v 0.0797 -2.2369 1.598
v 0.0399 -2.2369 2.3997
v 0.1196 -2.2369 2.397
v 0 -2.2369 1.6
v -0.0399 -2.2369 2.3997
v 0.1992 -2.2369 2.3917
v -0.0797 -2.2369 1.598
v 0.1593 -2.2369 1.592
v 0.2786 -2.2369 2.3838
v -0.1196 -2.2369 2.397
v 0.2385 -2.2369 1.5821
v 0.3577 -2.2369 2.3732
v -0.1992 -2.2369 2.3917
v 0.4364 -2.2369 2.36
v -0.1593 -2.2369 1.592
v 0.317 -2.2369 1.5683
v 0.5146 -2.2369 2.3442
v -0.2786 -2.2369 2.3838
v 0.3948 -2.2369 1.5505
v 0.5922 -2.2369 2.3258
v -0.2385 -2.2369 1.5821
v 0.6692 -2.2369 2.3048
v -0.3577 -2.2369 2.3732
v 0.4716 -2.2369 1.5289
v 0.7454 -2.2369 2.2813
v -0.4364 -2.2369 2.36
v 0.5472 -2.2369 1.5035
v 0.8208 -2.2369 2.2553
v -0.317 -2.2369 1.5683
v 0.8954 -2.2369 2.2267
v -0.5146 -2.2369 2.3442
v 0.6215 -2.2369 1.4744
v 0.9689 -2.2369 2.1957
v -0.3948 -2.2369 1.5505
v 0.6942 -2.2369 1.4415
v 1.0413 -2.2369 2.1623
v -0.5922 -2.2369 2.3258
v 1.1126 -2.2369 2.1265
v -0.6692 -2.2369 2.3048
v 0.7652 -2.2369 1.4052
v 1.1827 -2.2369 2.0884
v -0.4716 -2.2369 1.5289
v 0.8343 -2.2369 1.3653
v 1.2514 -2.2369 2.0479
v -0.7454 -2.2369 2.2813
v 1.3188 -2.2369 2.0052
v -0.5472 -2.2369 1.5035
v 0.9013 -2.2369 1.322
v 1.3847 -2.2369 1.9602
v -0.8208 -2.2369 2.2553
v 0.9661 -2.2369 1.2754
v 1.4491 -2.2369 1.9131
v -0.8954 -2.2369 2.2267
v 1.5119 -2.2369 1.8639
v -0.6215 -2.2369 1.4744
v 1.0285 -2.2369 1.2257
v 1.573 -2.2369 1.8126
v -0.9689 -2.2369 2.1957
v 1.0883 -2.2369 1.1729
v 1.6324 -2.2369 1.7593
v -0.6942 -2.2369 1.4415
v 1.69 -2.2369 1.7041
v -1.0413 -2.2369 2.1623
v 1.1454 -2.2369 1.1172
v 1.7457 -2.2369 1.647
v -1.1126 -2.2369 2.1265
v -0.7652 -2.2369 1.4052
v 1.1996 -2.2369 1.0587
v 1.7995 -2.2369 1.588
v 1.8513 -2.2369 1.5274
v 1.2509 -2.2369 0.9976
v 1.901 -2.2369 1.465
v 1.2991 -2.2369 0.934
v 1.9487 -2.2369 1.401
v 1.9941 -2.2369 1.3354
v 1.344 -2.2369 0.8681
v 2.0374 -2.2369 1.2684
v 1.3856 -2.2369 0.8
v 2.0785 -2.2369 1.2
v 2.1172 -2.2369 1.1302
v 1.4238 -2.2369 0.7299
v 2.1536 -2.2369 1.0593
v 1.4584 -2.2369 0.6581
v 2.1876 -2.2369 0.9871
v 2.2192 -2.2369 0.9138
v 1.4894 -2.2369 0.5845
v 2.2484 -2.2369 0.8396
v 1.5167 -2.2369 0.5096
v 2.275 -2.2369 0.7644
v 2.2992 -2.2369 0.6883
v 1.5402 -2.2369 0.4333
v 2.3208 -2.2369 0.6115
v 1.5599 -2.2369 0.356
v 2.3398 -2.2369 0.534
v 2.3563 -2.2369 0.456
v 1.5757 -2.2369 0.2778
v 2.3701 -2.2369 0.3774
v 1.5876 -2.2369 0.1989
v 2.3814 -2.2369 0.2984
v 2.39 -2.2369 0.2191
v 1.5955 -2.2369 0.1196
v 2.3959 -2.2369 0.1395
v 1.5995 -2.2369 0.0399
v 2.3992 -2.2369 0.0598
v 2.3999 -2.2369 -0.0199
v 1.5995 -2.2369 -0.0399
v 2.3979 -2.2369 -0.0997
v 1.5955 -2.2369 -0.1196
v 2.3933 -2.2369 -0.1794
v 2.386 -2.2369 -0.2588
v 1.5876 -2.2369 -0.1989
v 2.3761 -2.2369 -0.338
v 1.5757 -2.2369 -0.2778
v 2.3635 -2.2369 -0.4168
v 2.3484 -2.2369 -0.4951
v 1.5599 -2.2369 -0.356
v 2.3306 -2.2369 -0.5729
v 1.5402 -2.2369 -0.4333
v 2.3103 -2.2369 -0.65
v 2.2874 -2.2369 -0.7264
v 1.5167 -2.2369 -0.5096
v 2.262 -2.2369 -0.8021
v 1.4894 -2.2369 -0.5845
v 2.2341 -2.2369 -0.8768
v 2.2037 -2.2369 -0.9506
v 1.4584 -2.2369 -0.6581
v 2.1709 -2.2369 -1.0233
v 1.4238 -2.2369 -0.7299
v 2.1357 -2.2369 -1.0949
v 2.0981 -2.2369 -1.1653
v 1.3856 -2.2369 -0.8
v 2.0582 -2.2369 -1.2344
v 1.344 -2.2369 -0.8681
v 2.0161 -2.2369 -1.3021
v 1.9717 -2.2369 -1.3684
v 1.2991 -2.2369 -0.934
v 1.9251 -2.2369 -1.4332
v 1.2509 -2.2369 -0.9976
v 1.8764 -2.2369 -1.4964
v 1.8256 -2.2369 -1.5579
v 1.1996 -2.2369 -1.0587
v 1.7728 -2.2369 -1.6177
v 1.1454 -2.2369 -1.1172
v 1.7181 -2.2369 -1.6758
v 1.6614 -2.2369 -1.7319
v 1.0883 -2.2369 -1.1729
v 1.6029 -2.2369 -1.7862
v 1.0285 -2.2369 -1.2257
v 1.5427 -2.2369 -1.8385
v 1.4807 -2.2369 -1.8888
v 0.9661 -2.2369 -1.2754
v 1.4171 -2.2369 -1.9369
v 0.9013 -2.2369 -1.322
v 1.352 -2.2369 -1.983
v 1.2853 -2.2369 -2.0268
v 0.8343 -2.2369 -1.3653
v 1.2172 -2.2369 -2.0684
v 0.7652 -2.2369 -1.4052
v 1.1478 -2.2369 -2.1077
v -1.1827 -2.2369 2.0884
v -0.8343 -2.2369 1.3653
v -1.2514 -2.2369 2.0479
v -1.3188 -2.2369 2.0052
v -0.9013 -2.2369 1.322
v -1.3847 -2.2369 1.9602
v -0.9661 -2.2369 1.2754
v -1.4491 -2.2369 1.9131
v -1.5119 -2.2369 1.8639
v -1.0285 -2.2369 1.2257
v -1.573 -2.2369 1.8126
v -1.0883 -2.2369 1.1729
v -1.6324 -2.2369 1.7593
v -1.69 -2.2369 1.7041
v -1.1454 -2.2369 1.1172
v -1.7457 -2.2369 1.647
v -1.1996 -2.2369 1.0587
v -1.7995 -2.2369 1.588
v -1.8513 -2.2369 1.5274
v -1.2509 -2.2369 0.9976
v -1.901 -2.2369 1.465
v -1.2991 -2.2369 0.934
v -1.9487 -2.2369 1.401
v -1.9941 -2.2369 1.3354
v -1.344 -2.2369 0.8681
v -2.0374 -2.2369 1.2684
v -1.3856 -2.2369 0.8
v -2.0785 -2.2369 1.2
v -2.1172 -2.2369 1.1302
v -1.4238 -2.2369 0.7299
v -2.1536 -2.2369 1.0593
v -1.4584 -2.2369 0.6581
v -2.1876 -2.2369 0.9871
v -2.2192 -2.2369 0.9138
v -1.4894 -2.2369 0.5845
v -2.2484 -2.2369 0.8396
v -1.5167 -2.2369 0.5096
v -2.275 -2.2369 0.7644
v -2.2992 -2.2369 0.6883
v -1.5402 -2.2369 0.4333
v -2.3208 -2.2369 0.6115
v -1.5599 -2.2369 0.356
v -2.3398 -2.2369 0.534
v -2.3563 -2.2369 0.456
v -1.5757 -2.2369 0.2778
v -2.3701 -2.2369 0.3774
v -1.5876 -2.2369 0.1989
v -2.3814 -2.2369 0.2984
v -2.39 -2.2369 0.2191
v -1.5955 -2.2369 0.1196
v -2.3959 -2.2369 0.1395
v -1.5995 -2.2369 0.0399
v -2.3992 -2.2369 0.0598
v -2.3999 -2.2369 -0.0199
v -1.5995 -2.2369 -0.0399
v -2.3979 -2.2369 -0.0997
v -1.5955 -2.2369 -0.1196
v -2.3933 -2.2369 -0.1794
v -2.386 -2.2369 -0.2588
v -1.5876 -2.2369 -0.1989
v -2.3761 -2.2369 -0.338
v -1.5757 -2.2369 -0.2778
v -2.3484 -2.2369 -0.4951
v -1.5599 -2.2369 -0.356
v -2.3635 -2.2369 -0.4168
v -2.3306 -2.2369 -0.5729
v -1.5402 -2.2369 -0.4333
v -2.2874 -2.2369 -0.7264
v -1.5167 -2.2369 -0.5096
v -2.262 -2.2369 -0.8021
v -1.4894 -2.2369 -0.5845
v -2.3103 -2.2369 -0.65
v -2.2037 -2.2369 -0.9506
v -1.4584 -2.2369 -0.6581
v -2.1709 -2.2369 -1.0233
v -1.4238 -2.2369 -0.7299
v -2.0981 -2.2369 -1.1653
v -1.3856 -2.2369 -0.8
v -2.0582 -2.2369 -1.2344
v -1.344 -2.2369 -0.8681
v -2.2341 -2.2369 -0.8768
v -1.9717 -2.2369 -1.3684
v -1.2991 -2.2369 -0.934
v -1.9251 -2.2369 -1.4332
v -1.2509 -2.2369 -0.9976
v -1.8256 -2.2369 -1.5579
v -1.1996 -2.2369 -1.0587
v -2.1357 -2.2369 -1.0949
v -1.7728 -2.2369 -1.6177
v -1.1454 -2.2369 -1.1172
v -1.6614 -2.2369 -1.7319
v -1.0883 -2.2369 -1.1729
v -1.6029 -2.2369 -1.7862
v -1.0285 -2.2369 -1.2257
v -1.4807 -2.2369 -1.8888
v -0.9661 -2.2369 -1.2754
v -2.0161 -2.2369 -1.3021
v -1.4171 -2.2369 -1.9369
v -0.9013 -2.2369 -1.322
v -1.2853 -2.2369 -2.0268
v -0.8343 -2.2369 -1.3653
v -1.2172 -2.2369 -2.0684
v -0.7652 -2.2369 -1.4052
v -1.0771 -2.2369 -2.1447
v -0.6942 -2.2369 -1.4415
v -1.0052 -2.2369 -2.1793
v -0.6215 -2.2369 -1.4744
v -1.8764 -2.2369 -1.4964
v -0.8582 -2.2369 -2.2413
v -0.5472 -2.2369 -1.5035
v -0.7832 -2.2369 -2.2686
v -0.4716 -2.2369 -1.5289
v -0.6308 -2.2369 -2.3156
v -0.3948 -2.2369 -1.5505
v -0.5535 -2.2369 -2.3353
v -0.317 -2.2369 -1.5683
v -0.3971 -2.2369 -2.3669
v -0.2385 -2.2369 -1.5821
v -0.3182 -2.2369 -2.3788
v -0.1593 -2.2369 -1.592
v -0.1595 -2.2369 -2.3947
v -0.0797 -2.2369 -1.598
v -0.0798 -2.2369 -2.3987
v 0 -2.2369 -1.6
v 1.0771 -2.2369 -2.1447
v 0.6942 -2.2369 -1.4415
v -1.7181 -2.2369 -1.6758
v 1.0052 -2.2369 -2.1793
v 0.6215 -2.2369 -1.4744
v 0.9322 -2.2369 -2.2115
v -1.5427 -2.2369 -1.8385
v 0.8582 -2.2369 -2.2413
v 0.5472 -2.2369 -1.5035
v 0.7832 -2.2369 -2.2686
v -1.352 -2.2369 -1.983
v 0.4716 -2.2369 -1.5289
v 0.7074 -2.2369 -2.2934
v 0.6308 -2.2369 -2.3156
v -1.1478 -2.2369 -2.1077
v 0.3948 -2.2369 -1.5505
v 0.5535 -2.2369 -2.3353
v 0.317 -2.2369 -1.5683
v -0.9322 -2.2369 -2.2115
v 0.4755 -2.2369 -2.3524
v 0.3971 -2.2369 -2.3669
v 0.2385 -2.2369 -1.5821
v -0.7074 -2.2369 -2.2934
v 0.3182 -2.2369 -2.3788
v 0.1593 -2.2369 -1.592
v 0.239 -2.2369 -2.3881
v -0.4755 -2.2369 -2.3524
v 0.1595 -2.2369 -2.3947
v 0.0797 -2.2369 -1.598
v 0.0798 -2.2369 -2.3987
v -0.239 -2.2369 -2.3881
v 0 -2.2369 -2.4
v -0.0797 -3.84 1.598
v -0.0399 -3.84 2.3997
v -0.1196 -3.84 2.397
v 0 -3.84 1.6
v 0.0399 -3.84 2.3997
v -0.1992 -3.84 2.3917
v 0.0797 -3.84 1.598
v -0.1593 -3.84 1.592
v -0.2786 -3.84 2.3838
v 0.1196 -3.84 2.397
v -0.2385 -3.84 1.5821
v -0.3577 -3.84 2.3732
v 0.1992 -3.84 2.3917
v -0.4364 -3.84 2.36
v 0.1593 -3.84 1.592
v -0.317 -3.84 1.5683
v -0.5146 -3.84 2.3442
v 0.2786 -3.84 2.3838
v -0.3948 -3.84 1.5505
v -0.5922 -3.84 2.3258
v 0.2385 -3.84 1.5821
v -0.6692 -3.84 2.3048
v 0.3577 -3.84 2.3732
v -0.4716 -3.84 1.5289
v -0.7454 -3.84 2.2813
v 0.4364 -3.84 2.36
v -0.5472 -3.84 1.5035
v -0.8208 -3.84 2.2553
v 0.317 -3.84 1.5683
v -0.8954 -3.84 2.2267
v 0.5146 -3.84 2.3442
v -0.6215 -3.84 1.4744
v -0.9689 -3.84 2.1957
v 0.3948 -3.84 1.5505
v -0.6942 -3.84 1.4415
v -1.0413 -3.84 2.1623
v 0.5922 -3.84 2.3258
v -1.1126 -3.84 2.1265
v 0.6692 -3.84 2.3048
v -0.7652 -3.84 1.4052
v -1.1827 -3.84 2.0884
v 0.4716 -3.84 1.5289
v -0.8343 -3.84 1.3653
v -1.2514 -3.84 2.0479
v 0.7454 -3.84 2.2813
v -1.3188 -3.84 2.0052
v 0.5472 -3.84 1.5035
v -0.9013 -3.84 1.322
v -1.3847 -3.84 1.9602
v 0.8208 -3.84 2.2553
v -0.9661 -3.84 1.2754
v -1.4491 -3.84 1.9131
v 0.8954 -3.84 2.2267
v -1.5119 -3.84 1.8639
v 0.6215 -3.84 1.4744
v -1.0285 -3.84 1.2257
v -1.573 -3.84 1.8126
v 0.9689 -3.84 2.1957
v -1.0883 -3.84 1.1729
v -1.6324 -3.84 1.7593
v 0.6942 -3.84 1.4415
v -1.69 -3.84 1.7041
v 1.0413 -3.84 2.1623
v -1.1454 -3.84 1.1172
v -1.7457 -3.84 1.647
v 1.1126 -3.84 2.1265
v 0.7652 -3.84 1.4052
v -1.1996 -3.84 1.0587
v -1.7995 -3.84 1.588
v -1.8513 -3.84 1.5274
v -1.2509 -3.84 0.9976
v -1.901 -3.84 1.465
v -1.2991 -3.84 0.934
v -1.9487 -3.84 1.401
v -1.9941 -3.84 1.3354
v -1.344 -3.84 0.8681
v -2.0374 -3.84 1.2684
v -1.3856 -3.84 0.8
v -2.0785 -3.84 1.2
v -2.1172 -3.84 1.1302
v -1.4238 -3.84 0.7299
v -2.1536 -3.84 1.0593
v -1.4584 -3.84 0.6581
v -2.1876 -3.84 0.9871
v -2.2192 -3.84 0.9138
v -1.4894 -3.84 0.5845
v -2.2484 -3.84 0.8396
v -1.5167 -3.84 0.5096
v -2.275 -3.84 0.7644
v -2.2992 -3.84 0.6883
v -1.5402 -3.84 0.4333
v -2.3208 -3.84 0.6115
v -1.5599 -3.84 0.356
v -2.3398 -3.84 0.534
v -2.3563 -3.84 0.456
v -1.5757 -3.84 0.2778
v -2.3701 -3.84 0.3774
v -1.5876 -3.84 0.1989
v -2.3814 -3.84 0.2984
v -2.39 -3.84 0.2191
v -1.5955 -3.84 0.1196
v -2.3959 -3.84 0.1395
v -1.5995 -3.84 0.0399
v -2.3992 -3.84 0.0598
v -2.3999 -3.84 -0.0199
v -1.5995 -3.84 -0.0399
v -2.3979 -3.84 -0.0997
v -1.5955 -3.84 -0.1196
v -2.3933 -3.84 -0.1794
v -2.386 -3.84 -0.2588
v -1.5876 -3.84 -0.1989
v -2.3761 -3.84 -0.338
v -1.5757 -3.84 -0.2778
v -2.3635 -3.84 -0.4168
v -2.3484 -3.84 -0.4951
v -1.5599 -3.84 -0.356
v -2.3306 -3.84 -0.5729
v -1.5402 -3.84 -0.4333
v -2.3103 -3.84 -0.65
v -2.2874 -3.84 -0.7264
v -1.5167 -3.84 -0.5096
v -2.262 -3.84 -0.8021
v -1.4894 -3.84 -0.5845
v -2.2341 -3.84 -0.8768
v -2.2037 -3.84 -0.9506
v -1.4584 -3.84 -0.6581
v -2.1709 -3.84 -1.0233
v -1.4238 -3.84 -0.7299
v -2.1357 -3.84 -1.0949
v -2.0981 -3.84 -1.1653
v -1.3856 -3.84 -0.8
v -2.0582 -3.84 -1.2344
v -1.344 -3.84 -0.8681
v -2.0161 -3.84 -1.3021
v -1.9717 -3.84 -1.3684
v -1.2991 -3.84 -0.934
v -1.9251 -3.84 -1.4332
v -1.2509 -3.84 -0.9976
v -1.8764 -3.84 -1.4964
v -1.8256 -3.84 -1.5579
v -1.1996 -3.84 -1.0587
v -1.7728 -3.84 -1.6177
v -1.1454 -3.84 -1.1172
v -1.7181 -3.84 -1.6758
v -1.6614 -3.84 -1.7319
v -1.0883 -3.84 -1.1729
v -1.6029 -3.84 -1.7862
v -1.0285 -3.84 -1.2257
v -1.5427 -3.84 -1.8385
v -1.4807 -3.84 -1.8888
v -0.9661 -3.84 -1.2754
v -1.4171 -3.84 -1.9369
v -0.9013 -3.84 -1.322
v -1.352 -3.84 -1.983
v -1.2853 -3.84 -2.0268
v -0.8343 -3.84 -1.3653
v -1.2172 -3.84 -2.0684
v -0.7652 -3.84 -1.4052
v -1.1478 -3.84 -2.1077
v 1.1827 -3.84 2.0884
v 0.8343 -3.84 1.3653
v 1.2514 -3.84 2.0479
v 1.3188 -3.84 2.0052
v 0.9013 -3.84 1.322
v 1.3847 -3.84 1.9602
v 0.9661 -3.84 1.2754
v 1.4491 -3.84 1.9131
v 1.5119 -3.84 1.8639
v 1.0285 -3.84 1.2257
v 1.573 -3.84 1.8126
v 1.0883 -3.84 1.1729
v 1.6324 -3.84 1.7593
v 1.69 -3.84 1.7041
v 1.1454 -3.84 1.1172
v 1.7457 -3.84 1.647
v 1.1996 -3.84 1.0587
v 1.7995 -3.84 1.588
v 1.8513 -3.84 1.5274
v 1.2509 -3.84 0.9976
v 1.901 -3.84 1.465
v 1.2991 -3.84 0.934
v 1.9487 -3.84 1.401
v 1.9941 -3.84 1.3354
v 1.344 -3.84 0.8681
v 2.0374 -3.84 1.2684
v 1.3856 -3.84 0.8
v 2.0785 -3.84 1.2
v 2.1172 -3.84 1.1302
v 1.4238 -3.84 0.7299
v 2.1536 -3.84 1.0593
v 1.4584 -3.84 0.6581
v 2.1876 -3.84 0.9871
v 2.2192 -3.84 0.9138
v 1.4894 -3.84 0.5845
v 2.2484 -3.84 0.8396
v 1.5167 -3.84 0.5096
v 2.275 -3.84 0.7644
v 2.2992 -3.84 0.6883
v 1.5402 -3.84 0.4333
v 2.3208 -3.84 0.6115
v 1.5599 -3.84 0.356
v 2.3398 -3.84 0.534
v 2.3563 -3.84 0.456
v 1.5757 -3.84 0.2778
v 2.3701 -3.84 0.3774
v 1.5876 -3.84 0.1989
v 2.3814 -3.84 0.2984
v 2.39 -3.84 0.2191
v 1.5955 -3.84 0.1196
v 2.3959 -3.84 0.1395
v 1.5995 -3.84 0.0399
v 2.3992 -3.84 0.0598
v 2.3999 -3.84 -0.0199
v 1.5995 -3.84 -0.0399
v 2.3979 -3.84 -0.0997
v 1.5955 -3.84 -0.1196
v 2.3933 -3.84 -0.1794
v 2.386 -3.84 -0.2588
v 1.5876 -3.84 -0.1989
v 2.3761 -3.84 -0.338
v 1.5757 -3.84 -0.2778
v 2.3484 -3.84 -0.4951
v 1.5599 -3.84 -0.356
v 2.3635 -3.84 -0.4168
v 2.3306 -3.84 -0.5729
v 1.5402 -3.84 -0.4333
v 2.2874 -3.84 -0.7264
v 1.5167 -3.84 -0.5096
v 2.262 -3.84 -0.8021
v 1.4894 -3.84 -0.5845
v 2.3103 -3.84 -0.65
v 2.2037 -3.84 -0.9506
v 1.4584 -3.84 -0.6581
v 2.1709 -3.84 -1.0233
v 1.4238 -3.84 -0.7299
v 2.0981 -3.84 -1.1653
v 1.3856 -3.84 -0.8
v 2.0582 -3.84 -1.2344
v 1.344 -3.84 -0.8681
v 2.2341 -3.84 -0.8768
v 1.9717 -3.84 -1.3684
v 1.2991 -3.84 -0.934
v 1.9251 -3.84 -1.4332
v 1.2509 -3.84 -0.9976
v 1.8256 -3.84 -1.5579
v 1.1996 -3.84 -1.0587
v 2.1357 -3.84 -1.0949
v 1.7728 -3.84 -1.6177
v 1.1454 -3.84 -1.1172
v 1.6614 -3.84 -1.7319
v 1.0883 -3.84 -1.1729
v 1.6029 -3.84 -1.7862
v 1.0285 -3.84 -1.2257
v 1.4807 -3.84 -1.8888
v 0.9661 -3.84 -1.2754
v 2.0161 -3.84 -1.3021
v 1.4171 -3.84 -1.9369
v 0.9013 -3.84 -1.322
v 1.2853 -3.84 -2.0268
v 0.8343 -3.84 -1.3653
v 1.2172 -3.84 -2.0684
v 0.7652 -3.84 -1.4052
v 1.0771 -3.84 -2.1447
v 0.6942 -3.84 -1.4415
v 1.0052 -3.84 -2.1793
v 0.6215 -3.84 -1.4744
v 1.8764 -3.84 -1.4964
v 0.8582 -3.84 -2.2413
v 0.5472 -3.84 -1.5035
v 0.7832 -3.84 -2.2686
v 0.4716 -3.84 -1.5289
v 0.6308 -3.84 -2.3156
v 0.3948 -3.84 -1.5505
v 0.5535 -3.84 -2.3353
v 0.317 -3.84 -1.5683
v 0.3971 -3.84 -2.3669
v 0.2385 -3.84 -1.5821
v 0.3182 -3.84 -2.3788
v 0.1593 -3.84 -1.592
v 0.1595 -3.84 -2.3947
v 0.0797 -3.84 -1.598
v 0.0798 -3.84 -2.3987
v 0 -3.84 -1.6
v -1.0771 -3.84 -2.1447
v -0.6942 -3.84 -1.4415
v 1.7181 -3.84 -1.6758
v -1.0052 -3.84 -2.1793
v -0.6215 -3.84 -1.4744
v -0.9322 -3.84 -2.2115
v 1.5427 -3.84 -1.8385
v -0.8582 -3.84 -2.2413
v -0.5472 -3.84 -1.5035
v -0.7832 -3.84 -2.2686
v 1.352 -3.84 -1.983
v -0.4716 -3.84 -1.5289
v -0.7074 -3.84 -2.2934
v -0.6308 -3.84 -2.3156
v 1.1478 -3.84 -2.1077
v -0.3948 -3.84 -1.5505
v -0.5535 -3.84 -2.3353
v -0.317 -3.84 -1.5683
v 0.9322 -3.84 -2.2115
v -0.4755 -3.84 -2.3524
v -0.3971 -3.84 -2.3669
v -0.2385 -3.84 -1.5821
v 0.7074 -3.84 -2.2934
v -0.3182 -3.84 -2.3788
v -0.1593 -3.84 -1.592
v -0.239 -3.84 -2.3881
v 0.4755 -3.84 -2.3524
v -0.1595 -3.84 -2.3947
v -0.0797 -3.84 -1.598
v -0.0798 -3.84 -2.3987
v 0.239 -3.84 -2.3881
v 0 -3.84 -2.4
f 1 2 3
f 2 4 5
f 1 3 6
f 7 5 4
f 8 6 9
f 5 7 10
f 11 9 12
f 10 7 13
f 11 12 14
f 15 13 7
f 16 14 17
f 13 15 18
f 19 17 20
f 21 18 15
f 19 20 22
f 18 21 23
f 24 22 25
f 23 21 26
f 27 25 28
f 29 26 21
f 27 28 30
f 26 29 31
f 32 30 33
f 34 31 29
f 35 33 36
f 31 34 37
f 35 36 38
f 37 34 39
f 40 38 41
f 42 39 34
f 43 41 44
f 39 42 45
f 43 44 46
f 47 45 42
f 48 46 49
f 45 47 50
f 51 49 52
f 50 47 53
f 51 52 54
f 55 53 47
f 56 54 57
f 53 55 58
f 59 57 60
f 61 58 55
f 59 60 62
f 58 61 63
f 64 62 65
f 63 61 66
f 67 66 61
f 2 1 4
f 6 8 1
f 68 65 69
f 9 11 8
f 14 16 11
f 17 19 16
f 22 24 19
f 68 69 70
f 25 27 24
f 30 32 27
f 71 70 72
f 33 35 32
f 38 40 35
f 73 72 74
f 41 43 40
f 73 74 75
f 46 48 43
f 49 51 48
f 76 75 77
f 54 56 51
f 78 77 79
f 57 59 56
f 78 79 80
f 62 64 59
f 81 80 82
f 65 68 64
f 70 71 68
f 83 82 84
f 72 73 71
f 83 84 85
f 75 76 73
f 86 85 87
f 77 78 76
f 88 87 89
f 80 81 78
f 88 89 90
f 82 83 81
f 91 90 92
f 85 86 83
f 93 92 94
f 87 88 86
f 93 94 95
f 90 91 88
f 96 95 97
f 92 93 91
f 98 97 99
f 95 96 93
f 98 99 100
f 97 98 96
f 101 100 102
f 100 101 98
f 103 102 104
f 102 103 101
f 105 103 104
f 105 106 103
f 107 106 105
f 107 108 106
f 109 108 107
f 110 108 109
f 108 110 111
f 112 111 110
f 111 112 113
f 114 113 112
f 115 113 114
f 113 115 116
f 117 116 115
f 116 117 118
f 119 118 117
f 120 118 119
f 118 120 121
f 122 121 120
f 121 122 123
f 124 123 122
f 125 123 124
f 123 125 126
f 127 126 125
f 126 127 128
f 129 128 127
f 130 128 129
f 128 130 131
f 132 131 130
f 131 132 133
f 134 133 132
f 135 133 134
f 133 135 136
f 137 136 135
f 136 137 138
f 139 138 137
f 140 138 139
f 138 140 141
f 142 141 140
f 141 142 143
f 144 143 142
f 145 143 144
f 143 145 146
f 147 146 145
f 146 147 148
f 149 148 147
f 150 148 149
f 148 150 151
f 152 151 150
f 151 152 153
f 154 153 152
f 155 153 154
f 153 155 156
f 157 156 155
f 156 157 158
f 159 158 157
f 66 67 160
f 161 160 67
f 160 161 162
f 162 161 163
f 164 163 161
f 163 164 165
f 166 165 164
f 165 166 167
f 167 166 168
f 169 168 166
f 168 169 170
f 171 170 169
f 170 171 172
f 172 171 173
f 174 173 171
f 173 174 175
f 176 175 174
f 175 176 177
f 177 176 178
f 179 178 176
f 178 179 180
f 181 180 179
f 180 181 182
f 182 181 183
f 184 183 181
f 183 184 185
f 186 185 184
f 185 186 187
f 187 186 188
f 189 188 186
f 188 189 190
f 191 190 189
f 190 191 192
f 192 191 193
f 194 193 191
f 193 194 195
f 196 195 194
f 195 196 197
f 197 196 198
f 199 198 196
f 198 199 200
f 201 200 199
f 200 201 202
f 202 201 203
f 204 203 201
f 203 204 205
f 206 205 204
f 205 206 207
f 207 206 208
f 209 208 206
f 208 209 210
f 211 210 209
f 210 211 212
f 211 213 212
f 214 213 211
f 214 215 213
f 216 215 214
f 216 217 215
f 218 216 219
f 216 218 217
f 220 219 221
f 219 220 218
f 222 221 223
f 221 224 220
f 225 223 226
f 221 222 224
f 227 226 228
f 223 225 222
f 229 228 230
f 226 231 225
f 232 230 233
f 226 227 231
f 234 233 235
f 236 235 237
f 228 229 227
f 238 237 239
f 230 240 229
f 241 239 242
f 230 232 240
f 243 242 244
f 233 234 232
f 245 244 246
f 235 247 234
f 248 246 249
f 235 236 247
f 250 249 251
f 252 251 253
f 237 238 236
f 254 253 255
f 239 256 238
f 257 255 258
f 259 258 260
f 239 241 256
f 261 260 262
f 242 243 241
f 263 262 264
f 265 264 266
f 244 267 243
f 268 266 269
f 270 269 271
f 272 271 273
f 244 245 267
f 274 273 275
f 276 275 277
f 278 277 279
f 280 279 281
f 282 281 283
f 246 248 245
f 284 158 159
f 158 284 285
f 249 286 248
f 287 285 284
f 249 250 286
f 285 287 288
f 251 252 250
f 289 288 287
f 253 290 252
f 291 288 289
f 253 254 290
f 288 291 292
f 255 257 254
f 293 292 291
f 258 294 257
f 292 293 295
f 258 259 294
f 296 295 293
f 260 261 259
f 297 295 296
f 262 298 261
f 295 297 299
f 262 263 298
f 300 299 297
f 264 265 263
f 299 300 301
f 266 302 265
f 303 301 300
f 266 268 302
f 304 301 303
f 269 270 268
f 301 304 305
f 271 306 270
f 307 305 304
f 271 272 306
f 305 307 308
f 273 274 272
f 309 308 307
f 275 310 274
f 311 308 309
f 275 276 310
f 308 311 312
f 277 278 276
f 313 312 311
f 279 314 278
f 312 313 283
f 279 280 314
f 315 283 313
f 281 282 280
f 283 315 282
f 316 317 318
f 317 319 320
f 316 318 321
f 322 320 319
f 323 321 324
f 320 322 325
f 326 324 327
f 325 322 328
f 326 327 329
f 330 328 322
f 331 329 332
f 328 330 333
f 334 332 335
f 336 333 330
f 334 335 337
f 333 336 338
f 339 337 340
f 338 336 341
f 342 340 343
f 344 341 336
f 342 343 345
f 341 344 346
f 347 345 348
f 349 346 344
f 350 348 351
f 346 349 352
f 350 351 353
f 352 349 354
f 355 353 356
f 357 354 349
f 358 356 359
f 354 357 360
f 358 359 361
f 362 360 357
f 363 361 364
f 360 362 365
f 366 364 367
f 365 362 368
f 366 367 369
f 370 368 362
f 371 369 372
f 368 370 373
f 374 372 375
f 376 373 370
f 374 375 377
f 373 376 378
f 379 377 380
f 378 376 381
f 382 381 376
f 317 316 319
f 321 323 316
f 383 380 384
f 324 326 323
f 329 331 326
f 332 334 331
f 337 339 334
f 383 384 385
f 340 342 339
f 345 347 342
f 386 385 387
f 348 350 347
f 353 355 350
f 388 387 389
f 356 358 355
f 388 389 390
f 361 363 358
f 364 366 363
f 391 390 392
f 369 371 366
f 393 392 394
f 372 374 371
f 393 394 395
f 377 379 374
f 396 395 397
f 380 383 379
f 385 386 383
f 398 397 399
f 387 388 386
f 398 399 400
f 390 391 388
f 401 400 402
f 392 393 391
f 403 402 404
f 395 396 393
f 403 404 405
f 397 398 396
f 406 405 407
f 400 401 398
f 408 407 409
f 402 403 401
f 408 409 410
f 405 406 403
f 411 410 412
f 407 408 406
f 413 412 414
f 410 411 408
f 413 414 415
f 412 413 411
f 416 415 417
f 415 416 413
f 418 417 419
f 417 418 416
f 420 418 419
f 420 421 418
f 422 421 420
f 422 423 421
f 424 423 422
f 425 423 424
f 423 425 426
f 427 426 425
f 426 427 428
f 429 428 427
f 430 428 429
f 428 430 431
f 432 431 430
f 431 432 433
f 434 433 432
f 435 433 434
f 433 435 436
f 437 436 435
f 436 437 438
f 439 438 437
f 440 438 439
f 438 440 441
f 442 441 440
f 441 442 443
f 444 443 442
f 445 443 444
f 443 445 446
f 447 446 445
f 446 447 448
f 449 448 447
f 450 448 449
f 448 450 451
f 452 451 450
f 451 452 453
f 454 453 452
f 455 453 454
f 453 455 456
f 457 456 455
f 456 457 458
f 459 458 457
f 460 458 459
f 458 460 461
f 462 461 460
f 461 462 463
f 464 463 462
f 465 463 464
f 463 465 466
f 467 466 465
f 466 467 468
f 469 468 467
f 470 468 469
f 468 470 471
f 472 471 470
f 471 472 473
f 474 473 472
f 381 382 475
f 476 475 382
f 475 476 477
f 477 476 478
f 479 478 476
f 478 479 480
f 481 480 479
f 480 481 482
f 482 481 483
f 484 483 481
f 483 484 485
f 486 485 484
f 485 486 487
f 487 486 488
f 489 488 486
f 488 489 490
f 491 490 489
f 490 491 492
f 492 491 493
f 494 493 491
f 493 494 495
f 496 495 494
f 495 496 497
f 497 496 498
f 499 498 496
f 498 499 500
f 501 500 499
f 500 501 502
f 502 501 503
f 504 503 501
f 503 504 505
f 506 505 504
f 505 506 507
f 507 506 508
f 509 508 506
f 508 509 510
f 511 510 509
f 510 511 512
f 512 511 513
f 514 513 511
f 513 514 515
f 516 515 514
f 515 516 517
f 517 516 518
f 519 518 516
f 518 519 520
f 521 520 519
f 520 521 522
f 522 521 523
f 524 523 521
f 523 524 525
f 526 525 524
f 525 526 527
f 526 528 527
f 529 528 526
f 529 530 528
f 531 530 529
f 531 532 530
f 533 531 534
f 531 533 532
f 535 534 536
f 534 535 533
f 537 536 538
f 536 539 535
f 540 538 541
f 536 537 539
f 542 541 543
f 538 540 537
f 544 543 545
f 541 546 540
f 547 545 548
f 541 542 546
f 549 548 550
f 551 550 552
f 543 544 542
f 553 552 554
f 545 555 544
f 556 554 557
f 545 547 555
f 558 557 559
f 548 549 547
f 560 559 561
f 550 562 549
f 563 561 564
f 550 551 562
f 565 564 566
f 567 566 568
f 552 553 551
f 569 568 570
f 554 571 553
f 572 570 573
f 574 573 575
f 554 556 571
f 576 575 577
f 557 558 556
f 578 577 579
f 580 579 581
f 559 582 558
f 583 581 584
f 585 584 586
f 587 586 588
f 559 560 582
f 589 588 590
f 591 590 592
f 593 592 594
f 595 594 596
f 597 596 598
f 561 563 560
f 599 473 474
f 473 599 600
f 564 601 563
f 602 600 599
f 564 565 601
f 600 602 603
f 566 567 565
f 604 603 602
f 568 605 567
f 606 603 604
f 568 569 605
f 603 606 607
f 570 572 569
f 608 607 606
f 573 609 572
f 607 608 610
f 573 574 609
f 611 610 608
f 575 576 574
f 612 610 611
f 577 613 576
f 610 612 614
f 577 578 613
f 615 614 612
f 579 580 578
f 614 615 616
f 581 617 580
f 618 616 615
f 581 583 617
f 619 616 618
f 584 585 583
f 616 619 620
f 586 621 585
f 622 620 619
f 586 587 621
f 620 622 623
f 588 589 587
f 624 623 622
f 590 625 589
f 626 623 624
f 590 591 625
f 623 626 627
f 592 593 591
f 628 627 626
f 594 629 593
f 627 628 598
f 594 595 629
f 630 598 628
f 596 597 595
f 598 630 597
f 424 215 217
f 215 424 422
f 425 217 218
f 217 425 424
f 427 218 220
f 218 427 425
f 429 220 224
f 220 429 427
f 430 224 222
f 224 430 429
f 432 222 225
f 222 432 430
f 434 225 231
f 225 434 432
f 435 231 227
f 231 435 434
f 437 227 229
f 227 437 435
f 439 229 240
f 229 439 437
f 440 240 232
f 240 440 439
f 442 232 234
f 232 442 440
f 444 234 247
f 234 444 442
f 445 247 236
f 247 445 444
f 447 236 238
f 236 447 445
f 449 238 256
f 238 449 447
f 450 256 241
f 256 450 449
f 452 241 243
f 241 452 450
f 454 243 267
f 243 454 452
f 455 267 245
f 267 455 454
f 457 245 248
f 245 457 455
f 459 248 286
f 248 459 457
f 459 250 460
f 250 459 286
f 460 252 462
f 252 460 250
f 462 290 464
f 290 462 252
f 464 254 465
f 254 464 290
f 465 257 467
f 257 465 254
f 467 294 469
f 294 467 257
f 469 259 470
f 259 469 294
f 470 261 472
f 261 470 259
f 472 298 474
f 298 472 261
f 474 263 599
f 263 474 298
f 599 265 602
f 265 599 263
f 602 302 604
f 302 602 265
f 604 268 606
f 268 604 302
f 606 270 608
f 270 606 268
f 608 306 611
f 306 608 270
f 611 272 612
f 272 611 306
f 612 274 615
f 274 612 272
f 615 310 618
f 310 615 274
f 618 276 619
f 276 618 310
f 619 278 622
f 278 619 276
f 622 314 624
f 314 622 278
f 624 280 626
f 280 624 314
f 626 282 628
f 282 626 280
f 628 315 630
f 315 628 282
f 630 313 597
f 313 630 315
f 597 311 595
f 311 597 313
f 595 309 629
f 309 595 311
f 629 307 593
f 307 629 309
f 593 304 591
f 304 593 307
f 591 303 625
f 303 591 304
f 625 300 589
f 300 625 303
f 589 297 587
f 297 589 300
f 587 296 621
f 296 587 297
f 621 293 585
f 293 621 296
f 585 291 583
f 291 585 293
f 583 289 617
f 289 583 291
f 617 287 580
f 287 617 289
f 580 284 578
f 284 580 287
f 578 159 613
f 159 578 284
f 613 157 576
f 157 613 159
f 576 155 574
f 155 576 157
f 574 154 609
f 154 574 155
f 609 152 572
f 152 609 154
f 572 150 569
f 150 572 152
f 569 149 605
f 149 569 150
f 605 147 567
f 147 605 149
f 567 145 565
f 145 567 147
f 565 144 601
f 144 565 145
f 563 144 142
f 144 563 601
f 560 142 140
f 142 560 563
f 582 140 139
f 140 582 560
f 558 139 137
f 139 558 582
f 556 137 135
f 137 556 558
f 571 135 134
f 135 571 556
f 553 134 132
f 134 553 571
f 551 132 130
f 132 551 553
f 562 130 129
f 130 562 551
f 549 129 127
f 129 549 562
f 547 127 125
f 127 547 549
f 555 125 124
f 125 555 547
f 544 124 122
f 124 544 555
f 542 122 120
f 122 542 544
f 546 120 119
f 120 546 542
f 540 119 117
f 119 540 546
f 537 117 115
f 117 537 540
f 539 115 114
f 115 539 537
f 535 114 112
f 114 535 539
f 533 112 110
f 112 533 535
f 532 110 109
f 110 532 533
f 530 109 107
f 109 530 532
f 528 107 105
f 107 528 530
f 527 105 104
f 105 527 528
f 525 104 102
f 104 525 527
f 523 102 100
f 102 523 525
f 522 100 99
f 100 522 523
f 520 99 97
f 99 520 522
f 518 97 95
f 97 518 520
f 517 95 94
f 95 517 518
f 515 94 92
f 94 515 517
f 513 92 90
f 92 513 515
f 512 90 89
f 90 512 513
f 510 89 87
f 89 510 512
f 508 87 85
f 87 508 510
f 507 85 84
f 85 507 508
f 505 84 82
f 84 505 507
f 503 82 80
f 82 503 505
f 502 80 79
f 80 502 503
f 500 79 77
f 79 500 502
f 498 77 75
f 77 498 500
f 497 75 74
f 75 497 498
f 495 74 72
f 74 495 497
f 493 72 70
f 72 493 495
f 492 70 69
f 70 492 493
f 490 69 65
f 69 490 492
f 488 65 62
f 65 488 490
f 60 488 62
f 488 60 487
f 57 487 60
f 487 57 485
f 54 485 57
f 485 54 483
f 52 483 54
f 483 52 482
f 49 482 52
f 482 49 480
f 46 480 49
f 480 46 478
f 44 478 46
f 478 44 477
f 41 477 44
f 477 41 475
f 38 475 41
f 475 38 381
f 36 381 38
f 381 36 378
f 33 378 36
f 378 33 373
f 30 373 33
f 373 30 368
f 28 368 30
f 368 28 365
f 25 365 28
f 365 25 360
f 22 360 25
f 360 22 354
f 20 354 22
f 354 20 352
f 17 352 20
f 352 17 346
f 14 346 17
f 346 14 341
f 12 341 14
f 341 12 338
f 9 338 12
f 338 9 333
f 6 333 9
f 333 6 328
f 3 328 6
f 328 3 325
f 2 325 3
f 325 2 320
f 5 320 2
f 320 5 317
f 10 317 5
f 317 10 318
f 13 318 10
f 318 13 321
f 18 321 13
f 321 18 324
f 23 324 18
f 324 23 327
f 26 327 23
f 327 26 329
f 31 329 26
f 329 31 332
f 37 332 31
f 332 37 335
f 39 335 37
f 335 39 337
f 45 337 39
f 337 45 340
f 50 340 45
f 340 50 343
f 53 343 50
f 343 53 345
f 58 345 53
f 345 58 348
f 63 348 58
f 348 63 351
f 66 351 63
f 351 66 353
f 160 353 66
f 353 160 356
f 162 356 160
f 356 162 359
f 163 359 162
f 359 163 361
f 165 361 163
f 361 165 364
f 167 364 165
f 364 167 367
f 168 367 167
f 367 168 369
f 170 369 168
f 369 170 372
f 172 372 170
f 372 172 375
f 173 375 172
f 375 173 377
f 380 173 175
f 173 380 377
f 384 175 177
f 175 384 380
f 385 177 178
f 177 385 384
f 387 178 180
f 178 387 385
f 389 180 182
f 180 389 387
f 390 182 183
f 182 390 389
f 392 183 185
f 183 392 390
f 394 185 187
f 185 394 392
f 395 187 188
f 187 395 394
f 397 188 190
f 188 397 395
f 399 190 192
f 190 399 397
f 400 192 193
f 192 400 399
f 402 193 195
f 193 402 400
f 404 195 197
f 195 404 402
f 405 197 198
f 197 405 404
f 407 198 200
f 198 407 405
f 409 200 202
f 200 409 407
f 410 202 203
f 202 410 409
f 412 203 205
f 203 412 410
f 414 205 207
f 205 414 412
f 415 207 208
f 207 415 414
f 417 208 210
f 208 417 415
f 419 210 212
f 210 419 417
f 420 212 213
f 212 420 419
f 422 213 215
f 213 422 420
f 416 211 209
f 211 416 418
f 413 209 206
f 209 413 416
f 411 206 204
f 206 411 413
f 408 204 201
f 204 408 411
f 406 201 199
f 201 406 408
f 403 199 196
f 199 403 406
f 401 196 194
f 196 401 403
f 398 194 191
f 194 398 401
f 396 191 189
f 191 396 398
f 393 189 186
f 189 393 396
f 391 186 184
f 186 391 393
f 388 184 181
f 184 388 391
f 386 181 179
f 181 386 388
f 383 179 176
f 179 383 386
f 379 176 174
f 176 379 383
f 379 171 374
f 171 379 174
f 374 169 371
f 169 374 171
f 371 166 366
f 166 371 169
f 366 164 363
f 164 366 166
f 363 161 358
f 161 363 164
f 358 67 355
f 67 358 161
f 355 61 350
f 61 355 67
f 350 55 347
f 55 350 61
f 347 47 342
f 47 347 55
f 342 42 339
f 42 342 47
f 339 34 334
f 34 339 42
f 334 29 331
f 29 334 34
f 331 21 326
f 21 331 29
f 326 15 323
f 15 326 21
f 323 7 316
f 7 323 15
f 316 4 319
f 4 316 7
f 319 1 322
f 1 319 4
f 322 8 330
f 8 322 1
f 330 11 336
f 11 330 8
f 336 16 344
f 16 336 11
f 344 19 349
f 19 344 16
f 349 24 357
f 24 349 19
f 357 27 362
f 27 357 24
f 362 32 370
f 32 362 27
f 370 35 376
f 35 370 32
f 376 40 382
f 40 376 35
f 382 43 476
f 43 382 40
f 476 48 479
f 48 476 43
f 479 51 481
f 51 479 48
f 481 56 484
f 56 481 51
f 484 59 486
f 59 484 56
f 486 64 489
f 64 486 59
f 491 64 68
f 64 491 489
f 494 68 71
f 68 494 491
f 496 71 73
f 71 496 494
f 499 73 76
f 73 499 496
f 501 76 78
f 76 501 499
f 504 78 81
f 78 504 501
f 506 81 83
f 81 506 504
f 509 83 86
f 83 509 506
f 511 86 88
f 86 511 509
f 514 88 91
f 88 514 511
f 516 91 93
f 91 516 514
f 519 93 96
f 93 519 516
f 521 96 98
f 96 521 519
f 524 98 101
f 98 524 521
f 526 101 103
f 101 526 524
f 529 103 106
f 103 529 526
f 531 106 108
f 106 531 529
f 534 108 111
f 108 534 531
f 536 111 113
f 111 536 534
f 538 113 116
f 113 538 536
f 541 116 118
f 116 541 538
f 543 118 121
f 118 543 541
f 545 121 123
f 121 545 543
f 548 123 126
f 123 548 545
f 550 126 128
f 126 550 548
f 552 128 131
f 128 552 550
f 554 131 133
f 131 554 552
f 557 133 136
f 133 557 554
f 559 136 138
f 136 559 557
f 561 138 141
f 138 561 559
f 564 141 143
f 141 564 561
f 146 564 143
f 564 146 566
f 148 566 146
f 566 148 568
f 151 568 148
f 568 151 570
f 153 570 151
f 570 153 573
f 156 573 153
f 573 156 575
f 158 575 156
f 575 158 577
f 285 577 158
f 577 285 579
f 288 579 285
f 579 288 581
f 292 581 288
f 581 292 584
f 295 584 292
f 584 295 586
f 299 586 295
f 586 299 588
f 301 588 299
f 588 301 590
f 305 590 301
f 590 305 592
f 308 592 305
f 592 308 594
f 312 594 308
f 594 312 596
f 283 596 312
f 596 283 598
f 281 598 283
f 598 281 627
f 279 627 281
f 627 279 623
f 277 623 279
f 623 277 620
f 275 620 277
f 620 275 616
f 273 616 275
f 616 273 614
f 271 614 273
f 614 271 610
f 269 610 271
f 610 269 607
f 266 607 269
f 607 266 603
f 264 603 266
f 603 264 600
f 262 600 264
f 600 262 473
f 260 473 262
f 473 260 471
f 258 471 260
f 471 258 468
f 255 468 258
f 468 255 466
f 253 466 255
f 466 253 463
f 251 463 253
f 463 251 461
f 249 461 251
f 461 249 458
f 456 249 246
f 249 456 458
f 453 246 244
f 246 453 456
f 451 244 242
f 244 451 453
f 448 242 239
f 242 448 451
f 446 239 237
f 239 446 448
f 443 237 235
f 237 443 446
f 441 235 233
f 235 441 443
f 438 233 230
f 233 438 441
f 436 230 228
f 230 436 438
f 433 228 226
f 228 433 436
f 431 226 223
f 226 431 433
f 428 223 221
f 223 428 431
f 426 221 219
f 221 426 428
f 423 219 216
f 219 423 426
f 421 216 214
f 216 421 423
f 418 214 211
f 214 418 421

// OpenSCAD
use <../lib.scad>
use <s/37383s00.scad>
use <s/37383s01.scad>
$fa=1; $fs=0.2;
function ldraw_lib__37383p01(realsolid=false) = [
// 0 Wheel Rim 42 x 62 with 10 Spokes and  3 Pins with Silver Outline Pattern
// 0 Name: 37383p01.dat
// 0 Author: Philippe Hurbain [Philo]
// 0 !LDRAW_ORG Part UPDATE 2020-03
// 0 !LICENSE Licensed under CC BY 2.0 and CC BY 4.0 : see CAreadme.txt
// 
// 0 !HELP Tyre:
// 0 !HELP 1 256 0 0 26.4 1 0 0 0 1 0 0 0 1 23799.dat
// 0 !HELP Logo tile:
// 0 !HELP 1 16 0 0 -13.6 1 0 0 0 0 -1 0 1 0 98138pt1.dat
// 
// 0 BFC CERTIFY CCW
  [0,"BFC","CERTIFY"],
  [0,"BFC","CCW"],
// 
// 0 !KEYWORDS Bricklink 35187pb01, Bugatti, Chiron, set 42083
// 
// 0 !HISTORY 2020-12-29 [PTadmin] Official Update 2020-03
// 
// 
// 1 16 0 0 0 1 0 0 0 1 0 0 0 1 s\37383s00.dat
  [1,16,0,0,0,1,0,0,0,1,0,0,0,1, ldraw_lib__s__37383s00(realsolid)],
// 1 80 0 0 0 1 0 0 0 1 0 0 0 1 s\37383s01.dat
  [1,80,0,0,0,1,0,0,0,1,0,0,0,1, ldraw_lib__s__37383s01(realsolid)],
// 1 80 0 0 0 -1 0 0 0 1 0 0 0 1 s\37383s01.dat
  [1,80,0,0,0,-1,0,0,0,1,0,0,0,1, ldraw_lib__s__37383s01(realsolid)],
];
module ldraw_lib__37383p01(step=0, col=false, unit=2/5, alt=false, line=0.2, solid=!$preview)
    makepoly(ldraw_lib__37383p01(solid), step=step, col=col, unit=unit, alt=alt, line=line, solid=solid);
ldraw_lib__37383p01(line=0.2);
